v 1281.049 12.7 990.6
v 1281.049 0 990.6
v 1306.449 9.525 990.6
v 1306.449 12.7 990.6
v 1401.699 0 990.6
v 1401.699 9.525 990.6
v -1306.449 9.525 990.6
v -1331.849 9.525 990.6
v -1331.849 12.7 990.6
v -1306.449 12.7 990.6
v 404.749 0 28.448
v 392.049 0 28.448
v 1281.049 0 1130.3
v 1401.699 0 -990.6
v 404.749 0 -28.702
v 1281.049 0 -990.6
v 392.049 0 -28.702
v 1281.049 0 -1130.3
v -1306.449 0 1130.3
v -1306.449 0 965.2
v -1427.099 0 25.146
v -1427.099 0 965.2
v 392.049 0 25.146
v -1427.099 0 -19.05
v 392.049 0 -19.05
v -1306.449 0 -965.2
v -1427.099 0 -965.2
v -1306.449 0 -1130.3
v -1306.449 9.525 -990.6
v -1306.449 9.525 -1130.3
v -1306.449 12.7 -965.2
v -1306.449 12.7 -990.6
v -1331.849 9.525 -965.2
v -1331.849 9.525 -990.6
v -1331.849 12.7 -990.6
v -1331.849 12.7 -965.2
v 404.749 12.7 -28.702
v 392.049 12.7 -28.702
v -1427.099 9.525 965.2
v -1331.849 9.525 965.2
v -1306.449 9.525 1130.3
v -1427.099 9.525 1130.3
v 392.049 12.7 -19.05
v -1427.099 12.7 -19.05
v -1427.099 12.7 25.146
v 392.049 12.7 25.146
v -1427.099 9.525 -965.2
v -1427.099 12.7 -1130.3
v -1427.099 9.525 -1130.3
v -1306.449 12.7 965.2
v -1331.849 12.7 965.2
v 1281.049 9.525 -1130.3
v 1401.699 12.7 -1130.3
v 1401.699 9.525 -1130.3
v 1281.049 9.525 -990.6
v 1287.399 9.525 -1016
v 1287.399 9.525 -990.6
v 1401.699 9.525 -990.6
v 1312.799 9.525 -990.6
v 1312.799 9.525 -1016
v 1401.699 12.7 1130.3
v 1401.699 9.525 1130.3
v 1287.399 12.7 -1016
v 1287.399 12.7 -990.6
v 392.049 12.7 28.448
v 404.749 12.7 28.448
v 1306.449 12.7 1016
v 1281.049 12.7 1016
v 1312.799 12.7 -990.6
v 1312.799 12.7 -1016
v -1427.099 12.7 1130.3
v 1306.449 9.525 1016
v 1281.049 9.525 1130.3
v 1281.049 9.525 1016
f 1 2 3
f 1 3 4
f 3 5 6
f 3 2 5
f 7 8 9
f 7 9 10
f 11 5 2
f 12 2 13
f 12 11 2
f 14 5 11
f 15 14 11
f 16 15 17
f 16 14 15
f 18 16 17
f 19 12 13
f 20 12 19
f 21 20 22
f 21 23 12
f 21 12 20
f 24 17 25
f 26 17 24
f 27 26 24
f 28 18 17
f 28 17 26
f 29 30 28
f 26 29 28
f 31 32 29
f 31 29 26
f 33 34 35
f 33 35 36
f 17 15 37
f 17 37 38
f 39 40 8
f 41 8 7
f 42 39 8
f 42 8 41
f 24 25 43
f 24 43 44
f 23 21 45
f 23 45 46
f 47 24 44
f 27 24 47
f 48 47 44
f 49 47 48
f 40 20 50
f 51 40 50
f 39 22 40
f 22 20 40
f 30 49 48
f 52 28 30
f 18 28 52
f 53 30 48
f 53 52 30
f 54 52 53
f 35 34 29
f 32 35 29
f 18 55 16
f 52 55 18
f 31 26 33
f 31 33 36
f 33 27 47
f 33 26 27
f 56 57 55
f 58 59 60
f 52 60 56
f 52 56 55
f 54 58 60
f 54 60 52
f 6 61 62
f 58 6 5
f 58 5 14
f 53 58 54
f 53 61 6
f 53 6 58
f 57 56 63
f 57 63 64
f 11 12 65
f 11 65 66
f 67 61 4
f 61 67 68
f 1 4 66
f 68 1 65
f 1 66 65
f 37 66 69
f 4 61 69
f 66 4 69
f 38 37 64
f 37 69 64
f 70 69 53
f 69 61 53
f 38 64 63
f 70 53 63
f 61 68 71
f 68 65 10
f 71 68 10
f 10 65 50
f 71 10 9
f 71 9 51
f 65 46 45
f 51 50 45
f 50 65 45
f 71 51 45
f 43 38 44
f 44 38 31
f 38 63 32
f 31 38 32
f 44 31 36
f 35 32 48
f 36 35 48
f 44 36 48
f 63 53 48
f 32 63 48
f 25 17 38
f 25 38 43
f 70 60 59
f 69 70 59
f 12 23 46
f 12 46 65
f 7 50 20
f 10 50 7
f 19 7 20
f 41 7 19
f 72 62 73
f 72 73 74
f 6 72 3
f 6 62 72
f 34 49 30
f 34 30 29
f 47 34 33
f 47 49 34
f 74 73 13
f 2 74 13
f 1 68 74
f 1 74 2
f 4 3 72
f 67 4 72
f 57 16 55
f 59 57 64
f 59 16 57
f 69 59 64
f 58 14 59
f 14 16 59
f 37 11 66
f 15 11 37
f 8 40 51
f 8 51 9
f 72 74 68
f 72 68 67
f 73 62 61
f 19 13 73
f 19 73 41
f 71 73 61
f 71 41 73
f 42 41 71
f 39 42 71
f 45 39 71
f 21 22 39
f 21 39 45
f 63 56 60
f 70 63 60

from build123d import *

# Parameters (mm, degrees)
BOSS_EXTRUDE1_DEPTH = 12.7
SKETCH3_W           = 139.7
SKETCH3_H           = 9.525
CUT_EXTRUDE2_DEPTH  = 146.05
SKETCH4_W           = 165.1
SKETCH4_H           = 9.525
CUT_EXTRUDE3_DEPTH  = 120.65
SKETCH5_W           = 25.4
SKETCH5_H           = 25.4
CUT_EXTRUDE4_DEPTH  = 3.175
SKETCH6_W           = 25.4
SKETCH6_H           = 2260.6
CUT_EXTRUDE5_DEPTH  = 12.7


with BuildPart() as part:
    # Sketch1 → Boss-Extrude1 (new body)
    with BuildSketch(Plane(origin=(0, 0, 0), x_dir=(1, 0, 0), z_dir=(0, 1, 0))):
        Polygon((1427.099, -1130.3), (-1427.099, -1130.3), (-1427.099, -25.146), (392.049, -25.146), (392.049, -28.448), (404.749, -28.448), (404.749, 28.702), (392.049, 28.702), (392.049, 19.05), (-1427.099, 19.05), (-1427.099, 1130.3), (1427.099, 1130.3), align=None)
    extrude(amount=BOSS_EXTRUDE1_DEPTH)

    # Sketch3 → Cut-Extrude2 (cut)
    with BuildSketch(Plane(origin=(1427.099, 0, 0), x_dir=(0, 0, -1), z_dir=(1, 0, 0))):
        with Locations((-1060.45, 4.7625)):
            Rectangle(SKETCH3_W, SKETCH3_H)
        with Locations((1060.45, 4.7625)):
            Rectangle(SKETCH3_W, SKETCH3_H)
    extrude(amount=-CUT_EXTRUDE2_DEPTH, mode=Mode.SUBTRACT)

    # Sketch4 → Cut-Extrude3 (cut)
    with BuildSketch(Plane.ZY.offset(1427.099)):
        with Locations((1047.75, 4.7625)):
            Rectangle(SKETCH4_W, SKETCH4_H)
        with Locations((-1047.75, 4.7625)):
            Rectangle(SKETCH4_W, SKETCH4_H)
    extrude(amount=-CUT_EXTRUDE3_DEPTH, mode=Mode.SUBTRACT)

    # Sketch5 → Cut-Extrude4 (cut)
    with BuildSketch(Plane.XZ.offset(-9.525)):
        with Locations((-1319.149, 977.9)):
            Rectangle(SKETCH5_W, SKETCH5_H)
        with Locations((-1319.149, -977.9)):
            Rectangle(SKETCH5_W, SKETCH5_H)
        with Locations((1300.099, -1003.3)):
            Rectangle(SKETCH5_W, SKETCH5_H)
        with Locations((1293.749, 1003.3)):
            Rectangle(SKETCH5_W, SKETCH5_H)
    extrude(amount=-CUT_EXTRUDE4_DEPTH, mode=Mode.SUBTRACT)

    # Sketch6 → Cut-Extrude5 (cut)
    with BuildSketch(Plane(origin=(0, 12.7, 0), x_dir=(1, 0, 0), z_dir=(0, 1, 0))):
        with Locations((1414.399, 0)):
            Rectangle(SKETCH6_W, SKETCH6_H)
    extrude(amount=-CUT_EXTRUDE5_DEPTH, mode=Mode.SUBTRACT)


solid = part.part
